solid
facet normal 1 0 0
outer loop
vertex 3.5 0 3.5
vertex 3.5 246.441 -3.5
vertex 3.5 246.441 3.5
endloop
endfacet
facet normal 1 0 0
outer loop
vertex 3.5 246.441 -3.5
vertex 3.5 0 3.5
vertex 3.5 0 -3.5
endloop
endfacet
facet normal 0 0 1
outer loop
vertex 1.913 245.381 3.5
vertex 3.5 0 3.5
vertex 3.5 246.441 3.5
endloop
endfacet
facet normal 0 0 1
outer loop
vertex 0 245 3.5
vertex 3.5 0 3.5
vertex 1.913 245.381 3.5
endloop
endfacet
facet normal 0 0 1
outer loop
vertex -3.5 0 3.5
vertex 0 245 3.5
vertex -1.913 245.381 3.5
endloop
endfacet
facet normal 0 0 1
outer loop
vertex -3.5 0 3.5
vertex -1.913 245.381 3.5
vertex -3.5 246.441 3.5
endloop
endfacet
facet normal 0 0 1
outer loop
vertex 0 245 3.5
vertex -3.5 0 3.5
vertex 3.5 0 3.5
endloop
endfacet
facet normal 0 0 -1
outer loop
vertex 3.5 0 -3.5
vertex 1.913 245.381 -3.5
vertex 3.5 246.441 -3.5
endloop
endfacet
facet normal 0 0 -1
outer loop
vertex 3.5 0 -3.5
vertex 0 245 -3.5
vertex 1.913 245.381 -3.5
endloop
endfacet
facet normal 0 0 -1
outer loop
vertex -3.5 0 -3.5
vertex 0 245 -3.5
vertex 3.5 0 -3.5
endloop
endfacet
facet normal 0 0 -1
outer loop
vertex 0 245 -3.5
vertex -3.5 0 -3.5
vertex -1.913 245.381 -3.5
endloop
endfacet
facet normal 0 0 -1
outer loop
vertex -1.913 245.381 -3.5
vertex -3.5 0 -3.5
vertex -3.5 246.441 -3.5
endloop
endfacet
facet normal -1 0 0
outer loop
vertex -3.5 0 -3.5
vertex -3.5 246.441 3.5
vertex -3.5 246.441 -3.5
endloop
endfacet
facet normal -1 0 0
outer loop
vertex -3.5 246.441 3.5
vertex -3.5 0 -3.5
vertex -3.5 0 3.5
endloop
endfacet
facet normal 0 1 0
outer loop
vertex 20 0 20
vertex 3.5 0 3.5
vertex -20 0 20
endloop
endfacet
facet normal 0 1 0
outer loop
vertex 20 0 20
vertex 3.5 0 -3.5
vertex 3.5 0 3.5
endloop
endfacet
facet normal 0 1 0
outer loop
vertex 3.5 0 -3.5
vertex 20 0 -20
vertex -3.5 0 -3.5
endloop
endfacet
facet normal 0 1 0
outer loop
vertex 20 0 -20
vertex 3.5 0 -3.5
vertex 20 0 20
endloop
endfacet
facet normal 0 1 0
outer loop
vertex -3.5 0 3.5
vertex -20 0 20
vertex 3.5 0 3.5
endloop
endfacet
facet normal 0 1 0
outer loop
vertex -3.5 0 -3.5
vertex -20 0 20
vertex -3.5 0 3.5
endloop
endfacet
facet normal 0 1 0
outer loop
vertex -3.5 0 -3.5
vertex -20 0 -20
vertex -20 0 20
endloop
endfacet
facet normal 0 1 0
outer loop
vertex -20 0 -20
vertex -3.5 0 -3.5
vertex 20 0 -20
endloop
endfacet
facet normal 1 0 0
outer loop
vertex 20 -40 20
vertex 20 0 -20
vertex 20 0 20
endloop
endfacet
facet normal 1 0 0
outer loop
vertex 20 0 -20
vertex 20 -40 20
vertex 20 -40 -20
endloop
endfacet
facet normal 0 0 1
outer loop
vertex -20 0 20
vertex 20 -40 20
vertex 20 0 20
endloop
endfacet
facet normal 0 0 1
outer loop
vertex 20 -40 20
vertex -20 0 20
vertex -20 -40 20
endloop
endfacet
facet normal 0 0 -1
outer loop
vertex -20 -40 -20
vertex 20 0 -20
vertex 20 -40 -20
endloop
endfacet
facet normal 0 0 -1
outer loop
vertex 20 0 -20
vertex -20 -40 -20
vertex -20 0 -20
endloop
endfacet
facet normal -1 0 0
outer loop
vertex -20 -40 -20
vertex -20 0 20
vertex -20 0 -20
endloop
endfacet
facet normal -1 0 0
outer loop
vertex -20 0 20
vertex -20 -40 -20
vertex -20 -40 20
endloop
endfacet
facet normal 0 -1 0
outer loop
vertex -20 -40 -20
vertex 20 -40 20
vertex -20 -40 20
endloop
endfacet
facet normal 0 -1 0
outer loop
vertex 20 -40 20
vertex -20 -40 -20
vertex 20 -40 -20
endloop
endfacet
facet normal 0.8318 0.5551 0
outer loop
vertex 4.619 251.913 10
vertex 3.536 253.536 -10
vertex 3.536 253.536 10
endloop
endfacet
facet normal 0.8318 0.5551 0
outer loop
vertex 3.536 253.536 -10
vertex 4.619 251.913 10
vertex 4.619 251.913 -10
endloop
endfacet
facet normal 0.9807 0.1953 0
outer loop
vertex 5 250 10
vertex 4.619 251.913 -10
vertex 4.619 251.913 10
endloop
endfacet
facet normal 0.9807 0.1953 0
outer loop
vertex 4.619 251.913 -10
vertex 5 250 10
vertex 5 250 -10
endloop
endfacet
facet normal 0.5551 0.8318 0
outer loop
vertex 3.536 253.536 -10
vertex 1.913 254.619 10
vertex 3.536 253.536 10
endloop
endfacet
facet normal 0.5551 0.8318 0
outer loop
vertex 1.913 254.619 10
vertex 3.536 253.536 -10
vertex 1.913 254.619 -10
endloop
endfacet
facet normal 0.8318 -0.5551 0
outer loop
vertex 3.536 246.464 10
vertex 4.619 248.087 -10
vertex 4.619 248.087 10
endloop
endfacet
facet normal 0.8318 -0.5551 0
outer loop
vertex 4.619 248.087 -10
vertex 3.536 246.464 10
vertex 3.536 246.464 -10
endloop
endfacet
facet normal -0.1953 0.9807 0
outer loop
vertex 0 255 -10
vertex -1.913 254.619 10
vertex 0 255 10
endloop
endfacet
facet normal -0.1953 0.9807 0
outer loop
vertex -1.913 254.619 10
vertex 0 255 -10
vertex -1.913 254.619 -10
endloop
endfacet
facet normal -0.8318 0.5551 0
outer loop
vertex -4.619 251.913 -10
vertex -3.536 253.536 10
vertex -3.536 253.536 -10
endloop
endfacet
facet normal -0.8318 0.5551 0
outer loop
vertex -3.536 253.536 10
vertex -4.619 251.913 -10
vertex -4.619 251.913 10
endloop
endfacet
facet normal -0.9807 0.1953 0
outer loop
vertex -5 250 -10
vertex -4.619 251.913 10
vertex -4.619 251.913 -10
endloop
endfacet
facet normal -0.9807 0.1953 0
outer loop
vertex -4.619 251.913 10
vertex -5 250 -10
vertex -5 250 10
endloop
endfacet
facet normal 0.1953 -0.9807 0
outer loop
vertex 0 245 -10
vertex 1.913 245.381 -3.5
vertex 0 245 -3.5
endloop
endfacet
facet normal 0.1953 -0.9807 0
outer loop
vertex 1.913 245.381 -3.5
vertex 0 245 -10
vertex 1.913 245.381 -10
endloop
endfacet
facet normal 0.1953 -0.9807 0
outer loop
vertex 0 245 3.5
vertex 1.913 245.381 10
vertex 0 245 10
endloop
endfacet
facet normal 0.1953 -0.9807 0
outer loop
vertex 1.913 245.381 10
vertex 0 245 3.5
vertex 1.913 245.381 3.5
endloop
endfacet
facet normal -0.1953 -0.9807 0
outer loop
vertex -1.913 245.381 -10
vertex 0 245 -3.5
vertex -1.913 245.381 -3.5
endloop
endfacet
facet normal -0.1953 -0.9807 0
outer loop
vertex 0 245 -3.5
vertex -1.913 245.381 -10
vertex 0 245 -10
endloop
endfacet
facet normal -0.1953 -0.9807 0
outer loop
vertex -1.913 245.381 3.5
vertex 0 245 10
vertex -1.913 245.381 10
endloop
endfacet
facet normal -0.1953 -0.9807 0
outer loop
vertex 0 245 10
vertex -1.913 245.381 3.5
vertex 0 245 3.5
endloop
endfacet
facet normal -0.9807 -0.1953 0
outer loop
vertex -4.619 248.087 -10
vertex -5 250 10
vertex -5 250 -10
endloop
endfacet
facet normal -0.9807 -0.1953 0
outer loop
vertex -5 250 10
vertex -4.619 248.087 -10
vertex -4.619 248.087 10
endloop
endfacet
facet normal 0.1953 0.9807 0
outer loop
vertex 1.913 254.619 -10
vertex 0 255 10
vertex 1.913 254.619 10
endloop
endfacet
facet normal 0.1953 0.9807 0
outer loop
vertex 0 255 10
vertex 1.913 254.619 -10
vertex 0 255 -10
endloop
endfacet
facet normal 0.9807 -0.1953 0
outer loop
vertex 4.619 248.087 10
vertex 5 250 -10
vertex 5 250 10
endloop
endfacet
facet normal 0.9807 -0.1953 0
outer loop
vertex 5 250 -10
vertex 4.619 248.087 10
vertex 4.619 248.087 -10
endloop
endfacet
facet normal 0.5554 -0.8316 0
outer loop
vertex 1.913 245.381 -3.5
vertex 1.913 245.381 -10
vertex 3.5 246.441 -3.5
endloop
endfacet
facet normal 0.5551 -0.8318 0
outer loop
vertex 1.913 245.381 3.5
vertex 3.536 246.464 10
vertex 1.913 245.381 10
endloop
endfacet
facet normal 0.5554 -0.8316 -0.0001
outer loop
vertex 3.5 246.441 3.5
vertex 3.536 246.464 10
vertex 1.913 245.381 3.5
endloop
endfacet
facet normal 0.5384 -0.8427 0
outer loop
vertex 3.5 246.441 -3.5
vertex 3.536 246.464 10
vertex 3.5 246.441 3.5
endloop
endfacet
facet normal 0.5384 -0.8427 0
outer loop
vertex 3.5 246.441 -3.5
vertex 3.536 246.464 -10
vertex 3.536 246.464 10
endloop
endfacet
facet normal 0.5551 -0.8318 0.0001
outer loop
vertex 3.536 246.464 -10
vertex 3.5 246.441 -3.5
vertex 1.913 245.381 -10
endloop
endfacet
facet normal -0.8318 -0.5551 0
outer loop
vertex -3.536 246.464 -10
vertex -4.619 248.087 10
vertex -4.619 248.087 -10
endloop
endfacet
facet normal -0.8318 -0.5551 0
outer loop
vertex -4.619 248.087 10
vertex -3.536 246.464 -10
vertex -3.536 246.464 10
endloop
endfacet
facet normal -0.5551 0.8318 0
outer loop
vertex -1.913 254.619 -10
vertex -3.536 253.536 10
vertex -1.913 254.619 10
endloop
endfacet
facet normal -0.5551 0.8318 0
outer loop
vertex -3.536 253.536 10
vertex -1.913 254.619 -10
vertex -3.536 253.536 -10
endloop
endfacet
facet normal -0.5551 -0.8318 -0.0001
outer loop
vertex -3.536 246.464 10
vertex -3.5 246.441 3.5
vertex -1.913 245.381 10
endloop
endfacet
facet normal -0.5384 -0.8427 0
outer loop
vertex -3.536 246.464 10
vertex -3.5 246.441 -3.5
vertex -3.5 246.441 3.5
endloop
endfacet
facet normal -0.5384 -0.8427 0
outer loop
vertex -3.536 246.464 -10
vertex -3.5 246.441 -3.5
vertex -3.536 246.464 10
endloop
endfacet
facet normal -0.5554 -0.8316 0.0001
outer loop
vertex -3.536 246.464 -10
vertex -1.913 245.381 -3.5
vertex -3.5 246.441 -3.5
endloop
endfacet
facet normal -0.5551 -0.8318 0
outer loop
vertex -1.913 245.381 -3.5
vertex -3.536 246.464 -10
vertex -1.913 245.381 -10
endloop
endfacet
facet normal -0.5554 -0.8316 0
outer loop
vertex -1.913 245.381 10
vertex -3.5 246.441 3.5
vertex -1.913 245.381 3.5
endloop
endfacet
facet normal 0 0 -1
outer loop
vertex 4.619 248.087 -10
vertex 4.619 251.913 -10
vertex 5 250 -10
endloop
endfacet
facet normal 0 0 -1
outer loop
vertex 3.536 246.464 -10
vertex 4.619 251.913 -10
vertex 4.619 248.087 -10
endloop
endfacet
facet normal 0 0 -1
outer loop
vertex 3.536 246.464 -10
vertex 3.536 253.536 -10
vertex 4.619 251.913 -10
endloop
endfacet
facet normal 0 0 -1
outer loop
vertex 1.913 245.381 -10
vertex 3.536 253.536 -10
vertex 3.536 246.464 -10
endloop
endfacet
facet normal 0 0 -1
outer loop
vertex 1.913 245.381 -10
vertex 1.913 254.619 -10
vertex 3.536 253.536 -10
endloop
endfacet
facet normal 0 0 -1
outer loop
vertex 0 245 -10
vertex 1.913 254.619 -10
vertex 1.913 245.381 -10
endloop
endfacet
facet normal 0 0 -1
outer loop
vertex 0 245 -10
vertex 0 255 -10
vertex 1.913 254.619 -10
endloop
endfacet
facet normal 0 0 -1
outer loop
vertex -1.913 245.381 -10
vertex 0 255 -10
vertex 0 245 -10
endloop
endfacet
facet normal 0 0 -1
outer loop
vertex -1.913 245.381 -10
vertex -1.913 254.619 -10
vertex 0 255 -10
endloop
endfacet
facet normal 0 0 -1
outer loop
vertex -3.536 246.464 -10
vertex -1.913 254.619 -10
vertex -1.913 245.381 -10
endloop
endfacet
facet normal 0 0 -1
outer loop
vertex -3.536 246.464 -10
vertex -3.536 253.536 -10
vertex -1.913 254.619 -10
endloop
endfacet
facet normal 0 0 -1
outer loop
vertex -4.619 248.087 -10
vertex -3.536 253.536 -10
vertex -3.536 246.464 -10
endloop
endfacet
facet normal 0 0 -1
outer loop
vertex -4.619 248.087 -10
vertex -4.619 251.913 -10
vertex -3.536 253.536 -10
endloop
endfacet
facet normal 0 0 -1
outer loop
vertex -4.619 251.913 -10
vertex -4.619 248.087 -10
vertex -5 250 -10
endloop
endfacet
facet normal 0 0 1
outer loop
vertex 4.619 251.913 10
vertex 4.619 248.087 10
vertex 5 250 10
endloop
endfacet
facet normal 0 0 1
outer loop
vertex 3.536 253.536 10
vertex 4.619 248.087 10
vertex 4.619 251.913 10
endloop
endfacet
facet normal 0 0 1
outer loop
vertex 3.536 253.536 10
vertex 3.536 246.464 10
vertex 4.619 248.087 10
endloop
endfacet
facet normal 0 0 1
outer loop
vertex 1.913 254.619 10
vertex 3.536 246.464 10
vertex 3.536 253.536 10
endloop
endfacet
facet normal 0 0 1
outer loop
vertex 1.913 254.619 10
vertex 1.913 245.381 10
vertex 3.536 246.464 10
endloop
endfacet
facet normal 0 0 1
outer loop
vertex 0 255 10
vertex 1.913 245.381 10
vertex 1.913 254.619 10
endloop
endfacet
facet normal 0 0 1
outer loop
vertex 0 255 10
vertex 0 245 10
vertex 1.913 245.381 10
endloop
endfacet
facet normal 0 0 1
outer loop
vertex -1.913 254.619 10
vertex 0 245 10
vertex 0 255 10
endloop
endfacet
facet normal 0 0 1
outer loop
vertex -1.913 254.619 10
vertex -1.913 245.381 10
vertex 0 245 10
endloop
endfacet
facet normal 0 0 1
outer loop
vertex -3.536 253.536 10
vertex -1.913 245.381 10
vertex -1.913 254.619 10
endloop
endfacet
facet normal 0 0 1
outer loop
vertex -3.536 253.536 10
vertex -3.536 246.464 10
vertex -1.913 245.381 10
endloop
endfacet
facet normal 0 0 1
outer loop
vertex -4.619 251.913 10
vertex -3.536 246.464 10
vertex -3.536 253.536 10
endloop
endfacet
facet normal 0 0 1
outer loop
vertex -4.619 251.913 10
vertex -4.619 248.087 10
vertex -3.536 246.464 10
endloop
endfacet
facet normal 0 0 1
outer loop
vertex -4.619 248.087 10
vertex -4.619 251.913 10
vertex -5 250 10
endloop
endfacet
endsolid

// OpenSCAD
h=7;
w=7;
d=250;
padding=5;
bigarm=40;
smallarm=10;

union() {
    translate([0,d/2,0]) cube([w,d,h], center=true);
    translate([0,-bigarm/2,0]) cube(bigarm, center=true);
    translate([0,d,0]) cylinder(20,r=smallarm/2, center=true);
}
